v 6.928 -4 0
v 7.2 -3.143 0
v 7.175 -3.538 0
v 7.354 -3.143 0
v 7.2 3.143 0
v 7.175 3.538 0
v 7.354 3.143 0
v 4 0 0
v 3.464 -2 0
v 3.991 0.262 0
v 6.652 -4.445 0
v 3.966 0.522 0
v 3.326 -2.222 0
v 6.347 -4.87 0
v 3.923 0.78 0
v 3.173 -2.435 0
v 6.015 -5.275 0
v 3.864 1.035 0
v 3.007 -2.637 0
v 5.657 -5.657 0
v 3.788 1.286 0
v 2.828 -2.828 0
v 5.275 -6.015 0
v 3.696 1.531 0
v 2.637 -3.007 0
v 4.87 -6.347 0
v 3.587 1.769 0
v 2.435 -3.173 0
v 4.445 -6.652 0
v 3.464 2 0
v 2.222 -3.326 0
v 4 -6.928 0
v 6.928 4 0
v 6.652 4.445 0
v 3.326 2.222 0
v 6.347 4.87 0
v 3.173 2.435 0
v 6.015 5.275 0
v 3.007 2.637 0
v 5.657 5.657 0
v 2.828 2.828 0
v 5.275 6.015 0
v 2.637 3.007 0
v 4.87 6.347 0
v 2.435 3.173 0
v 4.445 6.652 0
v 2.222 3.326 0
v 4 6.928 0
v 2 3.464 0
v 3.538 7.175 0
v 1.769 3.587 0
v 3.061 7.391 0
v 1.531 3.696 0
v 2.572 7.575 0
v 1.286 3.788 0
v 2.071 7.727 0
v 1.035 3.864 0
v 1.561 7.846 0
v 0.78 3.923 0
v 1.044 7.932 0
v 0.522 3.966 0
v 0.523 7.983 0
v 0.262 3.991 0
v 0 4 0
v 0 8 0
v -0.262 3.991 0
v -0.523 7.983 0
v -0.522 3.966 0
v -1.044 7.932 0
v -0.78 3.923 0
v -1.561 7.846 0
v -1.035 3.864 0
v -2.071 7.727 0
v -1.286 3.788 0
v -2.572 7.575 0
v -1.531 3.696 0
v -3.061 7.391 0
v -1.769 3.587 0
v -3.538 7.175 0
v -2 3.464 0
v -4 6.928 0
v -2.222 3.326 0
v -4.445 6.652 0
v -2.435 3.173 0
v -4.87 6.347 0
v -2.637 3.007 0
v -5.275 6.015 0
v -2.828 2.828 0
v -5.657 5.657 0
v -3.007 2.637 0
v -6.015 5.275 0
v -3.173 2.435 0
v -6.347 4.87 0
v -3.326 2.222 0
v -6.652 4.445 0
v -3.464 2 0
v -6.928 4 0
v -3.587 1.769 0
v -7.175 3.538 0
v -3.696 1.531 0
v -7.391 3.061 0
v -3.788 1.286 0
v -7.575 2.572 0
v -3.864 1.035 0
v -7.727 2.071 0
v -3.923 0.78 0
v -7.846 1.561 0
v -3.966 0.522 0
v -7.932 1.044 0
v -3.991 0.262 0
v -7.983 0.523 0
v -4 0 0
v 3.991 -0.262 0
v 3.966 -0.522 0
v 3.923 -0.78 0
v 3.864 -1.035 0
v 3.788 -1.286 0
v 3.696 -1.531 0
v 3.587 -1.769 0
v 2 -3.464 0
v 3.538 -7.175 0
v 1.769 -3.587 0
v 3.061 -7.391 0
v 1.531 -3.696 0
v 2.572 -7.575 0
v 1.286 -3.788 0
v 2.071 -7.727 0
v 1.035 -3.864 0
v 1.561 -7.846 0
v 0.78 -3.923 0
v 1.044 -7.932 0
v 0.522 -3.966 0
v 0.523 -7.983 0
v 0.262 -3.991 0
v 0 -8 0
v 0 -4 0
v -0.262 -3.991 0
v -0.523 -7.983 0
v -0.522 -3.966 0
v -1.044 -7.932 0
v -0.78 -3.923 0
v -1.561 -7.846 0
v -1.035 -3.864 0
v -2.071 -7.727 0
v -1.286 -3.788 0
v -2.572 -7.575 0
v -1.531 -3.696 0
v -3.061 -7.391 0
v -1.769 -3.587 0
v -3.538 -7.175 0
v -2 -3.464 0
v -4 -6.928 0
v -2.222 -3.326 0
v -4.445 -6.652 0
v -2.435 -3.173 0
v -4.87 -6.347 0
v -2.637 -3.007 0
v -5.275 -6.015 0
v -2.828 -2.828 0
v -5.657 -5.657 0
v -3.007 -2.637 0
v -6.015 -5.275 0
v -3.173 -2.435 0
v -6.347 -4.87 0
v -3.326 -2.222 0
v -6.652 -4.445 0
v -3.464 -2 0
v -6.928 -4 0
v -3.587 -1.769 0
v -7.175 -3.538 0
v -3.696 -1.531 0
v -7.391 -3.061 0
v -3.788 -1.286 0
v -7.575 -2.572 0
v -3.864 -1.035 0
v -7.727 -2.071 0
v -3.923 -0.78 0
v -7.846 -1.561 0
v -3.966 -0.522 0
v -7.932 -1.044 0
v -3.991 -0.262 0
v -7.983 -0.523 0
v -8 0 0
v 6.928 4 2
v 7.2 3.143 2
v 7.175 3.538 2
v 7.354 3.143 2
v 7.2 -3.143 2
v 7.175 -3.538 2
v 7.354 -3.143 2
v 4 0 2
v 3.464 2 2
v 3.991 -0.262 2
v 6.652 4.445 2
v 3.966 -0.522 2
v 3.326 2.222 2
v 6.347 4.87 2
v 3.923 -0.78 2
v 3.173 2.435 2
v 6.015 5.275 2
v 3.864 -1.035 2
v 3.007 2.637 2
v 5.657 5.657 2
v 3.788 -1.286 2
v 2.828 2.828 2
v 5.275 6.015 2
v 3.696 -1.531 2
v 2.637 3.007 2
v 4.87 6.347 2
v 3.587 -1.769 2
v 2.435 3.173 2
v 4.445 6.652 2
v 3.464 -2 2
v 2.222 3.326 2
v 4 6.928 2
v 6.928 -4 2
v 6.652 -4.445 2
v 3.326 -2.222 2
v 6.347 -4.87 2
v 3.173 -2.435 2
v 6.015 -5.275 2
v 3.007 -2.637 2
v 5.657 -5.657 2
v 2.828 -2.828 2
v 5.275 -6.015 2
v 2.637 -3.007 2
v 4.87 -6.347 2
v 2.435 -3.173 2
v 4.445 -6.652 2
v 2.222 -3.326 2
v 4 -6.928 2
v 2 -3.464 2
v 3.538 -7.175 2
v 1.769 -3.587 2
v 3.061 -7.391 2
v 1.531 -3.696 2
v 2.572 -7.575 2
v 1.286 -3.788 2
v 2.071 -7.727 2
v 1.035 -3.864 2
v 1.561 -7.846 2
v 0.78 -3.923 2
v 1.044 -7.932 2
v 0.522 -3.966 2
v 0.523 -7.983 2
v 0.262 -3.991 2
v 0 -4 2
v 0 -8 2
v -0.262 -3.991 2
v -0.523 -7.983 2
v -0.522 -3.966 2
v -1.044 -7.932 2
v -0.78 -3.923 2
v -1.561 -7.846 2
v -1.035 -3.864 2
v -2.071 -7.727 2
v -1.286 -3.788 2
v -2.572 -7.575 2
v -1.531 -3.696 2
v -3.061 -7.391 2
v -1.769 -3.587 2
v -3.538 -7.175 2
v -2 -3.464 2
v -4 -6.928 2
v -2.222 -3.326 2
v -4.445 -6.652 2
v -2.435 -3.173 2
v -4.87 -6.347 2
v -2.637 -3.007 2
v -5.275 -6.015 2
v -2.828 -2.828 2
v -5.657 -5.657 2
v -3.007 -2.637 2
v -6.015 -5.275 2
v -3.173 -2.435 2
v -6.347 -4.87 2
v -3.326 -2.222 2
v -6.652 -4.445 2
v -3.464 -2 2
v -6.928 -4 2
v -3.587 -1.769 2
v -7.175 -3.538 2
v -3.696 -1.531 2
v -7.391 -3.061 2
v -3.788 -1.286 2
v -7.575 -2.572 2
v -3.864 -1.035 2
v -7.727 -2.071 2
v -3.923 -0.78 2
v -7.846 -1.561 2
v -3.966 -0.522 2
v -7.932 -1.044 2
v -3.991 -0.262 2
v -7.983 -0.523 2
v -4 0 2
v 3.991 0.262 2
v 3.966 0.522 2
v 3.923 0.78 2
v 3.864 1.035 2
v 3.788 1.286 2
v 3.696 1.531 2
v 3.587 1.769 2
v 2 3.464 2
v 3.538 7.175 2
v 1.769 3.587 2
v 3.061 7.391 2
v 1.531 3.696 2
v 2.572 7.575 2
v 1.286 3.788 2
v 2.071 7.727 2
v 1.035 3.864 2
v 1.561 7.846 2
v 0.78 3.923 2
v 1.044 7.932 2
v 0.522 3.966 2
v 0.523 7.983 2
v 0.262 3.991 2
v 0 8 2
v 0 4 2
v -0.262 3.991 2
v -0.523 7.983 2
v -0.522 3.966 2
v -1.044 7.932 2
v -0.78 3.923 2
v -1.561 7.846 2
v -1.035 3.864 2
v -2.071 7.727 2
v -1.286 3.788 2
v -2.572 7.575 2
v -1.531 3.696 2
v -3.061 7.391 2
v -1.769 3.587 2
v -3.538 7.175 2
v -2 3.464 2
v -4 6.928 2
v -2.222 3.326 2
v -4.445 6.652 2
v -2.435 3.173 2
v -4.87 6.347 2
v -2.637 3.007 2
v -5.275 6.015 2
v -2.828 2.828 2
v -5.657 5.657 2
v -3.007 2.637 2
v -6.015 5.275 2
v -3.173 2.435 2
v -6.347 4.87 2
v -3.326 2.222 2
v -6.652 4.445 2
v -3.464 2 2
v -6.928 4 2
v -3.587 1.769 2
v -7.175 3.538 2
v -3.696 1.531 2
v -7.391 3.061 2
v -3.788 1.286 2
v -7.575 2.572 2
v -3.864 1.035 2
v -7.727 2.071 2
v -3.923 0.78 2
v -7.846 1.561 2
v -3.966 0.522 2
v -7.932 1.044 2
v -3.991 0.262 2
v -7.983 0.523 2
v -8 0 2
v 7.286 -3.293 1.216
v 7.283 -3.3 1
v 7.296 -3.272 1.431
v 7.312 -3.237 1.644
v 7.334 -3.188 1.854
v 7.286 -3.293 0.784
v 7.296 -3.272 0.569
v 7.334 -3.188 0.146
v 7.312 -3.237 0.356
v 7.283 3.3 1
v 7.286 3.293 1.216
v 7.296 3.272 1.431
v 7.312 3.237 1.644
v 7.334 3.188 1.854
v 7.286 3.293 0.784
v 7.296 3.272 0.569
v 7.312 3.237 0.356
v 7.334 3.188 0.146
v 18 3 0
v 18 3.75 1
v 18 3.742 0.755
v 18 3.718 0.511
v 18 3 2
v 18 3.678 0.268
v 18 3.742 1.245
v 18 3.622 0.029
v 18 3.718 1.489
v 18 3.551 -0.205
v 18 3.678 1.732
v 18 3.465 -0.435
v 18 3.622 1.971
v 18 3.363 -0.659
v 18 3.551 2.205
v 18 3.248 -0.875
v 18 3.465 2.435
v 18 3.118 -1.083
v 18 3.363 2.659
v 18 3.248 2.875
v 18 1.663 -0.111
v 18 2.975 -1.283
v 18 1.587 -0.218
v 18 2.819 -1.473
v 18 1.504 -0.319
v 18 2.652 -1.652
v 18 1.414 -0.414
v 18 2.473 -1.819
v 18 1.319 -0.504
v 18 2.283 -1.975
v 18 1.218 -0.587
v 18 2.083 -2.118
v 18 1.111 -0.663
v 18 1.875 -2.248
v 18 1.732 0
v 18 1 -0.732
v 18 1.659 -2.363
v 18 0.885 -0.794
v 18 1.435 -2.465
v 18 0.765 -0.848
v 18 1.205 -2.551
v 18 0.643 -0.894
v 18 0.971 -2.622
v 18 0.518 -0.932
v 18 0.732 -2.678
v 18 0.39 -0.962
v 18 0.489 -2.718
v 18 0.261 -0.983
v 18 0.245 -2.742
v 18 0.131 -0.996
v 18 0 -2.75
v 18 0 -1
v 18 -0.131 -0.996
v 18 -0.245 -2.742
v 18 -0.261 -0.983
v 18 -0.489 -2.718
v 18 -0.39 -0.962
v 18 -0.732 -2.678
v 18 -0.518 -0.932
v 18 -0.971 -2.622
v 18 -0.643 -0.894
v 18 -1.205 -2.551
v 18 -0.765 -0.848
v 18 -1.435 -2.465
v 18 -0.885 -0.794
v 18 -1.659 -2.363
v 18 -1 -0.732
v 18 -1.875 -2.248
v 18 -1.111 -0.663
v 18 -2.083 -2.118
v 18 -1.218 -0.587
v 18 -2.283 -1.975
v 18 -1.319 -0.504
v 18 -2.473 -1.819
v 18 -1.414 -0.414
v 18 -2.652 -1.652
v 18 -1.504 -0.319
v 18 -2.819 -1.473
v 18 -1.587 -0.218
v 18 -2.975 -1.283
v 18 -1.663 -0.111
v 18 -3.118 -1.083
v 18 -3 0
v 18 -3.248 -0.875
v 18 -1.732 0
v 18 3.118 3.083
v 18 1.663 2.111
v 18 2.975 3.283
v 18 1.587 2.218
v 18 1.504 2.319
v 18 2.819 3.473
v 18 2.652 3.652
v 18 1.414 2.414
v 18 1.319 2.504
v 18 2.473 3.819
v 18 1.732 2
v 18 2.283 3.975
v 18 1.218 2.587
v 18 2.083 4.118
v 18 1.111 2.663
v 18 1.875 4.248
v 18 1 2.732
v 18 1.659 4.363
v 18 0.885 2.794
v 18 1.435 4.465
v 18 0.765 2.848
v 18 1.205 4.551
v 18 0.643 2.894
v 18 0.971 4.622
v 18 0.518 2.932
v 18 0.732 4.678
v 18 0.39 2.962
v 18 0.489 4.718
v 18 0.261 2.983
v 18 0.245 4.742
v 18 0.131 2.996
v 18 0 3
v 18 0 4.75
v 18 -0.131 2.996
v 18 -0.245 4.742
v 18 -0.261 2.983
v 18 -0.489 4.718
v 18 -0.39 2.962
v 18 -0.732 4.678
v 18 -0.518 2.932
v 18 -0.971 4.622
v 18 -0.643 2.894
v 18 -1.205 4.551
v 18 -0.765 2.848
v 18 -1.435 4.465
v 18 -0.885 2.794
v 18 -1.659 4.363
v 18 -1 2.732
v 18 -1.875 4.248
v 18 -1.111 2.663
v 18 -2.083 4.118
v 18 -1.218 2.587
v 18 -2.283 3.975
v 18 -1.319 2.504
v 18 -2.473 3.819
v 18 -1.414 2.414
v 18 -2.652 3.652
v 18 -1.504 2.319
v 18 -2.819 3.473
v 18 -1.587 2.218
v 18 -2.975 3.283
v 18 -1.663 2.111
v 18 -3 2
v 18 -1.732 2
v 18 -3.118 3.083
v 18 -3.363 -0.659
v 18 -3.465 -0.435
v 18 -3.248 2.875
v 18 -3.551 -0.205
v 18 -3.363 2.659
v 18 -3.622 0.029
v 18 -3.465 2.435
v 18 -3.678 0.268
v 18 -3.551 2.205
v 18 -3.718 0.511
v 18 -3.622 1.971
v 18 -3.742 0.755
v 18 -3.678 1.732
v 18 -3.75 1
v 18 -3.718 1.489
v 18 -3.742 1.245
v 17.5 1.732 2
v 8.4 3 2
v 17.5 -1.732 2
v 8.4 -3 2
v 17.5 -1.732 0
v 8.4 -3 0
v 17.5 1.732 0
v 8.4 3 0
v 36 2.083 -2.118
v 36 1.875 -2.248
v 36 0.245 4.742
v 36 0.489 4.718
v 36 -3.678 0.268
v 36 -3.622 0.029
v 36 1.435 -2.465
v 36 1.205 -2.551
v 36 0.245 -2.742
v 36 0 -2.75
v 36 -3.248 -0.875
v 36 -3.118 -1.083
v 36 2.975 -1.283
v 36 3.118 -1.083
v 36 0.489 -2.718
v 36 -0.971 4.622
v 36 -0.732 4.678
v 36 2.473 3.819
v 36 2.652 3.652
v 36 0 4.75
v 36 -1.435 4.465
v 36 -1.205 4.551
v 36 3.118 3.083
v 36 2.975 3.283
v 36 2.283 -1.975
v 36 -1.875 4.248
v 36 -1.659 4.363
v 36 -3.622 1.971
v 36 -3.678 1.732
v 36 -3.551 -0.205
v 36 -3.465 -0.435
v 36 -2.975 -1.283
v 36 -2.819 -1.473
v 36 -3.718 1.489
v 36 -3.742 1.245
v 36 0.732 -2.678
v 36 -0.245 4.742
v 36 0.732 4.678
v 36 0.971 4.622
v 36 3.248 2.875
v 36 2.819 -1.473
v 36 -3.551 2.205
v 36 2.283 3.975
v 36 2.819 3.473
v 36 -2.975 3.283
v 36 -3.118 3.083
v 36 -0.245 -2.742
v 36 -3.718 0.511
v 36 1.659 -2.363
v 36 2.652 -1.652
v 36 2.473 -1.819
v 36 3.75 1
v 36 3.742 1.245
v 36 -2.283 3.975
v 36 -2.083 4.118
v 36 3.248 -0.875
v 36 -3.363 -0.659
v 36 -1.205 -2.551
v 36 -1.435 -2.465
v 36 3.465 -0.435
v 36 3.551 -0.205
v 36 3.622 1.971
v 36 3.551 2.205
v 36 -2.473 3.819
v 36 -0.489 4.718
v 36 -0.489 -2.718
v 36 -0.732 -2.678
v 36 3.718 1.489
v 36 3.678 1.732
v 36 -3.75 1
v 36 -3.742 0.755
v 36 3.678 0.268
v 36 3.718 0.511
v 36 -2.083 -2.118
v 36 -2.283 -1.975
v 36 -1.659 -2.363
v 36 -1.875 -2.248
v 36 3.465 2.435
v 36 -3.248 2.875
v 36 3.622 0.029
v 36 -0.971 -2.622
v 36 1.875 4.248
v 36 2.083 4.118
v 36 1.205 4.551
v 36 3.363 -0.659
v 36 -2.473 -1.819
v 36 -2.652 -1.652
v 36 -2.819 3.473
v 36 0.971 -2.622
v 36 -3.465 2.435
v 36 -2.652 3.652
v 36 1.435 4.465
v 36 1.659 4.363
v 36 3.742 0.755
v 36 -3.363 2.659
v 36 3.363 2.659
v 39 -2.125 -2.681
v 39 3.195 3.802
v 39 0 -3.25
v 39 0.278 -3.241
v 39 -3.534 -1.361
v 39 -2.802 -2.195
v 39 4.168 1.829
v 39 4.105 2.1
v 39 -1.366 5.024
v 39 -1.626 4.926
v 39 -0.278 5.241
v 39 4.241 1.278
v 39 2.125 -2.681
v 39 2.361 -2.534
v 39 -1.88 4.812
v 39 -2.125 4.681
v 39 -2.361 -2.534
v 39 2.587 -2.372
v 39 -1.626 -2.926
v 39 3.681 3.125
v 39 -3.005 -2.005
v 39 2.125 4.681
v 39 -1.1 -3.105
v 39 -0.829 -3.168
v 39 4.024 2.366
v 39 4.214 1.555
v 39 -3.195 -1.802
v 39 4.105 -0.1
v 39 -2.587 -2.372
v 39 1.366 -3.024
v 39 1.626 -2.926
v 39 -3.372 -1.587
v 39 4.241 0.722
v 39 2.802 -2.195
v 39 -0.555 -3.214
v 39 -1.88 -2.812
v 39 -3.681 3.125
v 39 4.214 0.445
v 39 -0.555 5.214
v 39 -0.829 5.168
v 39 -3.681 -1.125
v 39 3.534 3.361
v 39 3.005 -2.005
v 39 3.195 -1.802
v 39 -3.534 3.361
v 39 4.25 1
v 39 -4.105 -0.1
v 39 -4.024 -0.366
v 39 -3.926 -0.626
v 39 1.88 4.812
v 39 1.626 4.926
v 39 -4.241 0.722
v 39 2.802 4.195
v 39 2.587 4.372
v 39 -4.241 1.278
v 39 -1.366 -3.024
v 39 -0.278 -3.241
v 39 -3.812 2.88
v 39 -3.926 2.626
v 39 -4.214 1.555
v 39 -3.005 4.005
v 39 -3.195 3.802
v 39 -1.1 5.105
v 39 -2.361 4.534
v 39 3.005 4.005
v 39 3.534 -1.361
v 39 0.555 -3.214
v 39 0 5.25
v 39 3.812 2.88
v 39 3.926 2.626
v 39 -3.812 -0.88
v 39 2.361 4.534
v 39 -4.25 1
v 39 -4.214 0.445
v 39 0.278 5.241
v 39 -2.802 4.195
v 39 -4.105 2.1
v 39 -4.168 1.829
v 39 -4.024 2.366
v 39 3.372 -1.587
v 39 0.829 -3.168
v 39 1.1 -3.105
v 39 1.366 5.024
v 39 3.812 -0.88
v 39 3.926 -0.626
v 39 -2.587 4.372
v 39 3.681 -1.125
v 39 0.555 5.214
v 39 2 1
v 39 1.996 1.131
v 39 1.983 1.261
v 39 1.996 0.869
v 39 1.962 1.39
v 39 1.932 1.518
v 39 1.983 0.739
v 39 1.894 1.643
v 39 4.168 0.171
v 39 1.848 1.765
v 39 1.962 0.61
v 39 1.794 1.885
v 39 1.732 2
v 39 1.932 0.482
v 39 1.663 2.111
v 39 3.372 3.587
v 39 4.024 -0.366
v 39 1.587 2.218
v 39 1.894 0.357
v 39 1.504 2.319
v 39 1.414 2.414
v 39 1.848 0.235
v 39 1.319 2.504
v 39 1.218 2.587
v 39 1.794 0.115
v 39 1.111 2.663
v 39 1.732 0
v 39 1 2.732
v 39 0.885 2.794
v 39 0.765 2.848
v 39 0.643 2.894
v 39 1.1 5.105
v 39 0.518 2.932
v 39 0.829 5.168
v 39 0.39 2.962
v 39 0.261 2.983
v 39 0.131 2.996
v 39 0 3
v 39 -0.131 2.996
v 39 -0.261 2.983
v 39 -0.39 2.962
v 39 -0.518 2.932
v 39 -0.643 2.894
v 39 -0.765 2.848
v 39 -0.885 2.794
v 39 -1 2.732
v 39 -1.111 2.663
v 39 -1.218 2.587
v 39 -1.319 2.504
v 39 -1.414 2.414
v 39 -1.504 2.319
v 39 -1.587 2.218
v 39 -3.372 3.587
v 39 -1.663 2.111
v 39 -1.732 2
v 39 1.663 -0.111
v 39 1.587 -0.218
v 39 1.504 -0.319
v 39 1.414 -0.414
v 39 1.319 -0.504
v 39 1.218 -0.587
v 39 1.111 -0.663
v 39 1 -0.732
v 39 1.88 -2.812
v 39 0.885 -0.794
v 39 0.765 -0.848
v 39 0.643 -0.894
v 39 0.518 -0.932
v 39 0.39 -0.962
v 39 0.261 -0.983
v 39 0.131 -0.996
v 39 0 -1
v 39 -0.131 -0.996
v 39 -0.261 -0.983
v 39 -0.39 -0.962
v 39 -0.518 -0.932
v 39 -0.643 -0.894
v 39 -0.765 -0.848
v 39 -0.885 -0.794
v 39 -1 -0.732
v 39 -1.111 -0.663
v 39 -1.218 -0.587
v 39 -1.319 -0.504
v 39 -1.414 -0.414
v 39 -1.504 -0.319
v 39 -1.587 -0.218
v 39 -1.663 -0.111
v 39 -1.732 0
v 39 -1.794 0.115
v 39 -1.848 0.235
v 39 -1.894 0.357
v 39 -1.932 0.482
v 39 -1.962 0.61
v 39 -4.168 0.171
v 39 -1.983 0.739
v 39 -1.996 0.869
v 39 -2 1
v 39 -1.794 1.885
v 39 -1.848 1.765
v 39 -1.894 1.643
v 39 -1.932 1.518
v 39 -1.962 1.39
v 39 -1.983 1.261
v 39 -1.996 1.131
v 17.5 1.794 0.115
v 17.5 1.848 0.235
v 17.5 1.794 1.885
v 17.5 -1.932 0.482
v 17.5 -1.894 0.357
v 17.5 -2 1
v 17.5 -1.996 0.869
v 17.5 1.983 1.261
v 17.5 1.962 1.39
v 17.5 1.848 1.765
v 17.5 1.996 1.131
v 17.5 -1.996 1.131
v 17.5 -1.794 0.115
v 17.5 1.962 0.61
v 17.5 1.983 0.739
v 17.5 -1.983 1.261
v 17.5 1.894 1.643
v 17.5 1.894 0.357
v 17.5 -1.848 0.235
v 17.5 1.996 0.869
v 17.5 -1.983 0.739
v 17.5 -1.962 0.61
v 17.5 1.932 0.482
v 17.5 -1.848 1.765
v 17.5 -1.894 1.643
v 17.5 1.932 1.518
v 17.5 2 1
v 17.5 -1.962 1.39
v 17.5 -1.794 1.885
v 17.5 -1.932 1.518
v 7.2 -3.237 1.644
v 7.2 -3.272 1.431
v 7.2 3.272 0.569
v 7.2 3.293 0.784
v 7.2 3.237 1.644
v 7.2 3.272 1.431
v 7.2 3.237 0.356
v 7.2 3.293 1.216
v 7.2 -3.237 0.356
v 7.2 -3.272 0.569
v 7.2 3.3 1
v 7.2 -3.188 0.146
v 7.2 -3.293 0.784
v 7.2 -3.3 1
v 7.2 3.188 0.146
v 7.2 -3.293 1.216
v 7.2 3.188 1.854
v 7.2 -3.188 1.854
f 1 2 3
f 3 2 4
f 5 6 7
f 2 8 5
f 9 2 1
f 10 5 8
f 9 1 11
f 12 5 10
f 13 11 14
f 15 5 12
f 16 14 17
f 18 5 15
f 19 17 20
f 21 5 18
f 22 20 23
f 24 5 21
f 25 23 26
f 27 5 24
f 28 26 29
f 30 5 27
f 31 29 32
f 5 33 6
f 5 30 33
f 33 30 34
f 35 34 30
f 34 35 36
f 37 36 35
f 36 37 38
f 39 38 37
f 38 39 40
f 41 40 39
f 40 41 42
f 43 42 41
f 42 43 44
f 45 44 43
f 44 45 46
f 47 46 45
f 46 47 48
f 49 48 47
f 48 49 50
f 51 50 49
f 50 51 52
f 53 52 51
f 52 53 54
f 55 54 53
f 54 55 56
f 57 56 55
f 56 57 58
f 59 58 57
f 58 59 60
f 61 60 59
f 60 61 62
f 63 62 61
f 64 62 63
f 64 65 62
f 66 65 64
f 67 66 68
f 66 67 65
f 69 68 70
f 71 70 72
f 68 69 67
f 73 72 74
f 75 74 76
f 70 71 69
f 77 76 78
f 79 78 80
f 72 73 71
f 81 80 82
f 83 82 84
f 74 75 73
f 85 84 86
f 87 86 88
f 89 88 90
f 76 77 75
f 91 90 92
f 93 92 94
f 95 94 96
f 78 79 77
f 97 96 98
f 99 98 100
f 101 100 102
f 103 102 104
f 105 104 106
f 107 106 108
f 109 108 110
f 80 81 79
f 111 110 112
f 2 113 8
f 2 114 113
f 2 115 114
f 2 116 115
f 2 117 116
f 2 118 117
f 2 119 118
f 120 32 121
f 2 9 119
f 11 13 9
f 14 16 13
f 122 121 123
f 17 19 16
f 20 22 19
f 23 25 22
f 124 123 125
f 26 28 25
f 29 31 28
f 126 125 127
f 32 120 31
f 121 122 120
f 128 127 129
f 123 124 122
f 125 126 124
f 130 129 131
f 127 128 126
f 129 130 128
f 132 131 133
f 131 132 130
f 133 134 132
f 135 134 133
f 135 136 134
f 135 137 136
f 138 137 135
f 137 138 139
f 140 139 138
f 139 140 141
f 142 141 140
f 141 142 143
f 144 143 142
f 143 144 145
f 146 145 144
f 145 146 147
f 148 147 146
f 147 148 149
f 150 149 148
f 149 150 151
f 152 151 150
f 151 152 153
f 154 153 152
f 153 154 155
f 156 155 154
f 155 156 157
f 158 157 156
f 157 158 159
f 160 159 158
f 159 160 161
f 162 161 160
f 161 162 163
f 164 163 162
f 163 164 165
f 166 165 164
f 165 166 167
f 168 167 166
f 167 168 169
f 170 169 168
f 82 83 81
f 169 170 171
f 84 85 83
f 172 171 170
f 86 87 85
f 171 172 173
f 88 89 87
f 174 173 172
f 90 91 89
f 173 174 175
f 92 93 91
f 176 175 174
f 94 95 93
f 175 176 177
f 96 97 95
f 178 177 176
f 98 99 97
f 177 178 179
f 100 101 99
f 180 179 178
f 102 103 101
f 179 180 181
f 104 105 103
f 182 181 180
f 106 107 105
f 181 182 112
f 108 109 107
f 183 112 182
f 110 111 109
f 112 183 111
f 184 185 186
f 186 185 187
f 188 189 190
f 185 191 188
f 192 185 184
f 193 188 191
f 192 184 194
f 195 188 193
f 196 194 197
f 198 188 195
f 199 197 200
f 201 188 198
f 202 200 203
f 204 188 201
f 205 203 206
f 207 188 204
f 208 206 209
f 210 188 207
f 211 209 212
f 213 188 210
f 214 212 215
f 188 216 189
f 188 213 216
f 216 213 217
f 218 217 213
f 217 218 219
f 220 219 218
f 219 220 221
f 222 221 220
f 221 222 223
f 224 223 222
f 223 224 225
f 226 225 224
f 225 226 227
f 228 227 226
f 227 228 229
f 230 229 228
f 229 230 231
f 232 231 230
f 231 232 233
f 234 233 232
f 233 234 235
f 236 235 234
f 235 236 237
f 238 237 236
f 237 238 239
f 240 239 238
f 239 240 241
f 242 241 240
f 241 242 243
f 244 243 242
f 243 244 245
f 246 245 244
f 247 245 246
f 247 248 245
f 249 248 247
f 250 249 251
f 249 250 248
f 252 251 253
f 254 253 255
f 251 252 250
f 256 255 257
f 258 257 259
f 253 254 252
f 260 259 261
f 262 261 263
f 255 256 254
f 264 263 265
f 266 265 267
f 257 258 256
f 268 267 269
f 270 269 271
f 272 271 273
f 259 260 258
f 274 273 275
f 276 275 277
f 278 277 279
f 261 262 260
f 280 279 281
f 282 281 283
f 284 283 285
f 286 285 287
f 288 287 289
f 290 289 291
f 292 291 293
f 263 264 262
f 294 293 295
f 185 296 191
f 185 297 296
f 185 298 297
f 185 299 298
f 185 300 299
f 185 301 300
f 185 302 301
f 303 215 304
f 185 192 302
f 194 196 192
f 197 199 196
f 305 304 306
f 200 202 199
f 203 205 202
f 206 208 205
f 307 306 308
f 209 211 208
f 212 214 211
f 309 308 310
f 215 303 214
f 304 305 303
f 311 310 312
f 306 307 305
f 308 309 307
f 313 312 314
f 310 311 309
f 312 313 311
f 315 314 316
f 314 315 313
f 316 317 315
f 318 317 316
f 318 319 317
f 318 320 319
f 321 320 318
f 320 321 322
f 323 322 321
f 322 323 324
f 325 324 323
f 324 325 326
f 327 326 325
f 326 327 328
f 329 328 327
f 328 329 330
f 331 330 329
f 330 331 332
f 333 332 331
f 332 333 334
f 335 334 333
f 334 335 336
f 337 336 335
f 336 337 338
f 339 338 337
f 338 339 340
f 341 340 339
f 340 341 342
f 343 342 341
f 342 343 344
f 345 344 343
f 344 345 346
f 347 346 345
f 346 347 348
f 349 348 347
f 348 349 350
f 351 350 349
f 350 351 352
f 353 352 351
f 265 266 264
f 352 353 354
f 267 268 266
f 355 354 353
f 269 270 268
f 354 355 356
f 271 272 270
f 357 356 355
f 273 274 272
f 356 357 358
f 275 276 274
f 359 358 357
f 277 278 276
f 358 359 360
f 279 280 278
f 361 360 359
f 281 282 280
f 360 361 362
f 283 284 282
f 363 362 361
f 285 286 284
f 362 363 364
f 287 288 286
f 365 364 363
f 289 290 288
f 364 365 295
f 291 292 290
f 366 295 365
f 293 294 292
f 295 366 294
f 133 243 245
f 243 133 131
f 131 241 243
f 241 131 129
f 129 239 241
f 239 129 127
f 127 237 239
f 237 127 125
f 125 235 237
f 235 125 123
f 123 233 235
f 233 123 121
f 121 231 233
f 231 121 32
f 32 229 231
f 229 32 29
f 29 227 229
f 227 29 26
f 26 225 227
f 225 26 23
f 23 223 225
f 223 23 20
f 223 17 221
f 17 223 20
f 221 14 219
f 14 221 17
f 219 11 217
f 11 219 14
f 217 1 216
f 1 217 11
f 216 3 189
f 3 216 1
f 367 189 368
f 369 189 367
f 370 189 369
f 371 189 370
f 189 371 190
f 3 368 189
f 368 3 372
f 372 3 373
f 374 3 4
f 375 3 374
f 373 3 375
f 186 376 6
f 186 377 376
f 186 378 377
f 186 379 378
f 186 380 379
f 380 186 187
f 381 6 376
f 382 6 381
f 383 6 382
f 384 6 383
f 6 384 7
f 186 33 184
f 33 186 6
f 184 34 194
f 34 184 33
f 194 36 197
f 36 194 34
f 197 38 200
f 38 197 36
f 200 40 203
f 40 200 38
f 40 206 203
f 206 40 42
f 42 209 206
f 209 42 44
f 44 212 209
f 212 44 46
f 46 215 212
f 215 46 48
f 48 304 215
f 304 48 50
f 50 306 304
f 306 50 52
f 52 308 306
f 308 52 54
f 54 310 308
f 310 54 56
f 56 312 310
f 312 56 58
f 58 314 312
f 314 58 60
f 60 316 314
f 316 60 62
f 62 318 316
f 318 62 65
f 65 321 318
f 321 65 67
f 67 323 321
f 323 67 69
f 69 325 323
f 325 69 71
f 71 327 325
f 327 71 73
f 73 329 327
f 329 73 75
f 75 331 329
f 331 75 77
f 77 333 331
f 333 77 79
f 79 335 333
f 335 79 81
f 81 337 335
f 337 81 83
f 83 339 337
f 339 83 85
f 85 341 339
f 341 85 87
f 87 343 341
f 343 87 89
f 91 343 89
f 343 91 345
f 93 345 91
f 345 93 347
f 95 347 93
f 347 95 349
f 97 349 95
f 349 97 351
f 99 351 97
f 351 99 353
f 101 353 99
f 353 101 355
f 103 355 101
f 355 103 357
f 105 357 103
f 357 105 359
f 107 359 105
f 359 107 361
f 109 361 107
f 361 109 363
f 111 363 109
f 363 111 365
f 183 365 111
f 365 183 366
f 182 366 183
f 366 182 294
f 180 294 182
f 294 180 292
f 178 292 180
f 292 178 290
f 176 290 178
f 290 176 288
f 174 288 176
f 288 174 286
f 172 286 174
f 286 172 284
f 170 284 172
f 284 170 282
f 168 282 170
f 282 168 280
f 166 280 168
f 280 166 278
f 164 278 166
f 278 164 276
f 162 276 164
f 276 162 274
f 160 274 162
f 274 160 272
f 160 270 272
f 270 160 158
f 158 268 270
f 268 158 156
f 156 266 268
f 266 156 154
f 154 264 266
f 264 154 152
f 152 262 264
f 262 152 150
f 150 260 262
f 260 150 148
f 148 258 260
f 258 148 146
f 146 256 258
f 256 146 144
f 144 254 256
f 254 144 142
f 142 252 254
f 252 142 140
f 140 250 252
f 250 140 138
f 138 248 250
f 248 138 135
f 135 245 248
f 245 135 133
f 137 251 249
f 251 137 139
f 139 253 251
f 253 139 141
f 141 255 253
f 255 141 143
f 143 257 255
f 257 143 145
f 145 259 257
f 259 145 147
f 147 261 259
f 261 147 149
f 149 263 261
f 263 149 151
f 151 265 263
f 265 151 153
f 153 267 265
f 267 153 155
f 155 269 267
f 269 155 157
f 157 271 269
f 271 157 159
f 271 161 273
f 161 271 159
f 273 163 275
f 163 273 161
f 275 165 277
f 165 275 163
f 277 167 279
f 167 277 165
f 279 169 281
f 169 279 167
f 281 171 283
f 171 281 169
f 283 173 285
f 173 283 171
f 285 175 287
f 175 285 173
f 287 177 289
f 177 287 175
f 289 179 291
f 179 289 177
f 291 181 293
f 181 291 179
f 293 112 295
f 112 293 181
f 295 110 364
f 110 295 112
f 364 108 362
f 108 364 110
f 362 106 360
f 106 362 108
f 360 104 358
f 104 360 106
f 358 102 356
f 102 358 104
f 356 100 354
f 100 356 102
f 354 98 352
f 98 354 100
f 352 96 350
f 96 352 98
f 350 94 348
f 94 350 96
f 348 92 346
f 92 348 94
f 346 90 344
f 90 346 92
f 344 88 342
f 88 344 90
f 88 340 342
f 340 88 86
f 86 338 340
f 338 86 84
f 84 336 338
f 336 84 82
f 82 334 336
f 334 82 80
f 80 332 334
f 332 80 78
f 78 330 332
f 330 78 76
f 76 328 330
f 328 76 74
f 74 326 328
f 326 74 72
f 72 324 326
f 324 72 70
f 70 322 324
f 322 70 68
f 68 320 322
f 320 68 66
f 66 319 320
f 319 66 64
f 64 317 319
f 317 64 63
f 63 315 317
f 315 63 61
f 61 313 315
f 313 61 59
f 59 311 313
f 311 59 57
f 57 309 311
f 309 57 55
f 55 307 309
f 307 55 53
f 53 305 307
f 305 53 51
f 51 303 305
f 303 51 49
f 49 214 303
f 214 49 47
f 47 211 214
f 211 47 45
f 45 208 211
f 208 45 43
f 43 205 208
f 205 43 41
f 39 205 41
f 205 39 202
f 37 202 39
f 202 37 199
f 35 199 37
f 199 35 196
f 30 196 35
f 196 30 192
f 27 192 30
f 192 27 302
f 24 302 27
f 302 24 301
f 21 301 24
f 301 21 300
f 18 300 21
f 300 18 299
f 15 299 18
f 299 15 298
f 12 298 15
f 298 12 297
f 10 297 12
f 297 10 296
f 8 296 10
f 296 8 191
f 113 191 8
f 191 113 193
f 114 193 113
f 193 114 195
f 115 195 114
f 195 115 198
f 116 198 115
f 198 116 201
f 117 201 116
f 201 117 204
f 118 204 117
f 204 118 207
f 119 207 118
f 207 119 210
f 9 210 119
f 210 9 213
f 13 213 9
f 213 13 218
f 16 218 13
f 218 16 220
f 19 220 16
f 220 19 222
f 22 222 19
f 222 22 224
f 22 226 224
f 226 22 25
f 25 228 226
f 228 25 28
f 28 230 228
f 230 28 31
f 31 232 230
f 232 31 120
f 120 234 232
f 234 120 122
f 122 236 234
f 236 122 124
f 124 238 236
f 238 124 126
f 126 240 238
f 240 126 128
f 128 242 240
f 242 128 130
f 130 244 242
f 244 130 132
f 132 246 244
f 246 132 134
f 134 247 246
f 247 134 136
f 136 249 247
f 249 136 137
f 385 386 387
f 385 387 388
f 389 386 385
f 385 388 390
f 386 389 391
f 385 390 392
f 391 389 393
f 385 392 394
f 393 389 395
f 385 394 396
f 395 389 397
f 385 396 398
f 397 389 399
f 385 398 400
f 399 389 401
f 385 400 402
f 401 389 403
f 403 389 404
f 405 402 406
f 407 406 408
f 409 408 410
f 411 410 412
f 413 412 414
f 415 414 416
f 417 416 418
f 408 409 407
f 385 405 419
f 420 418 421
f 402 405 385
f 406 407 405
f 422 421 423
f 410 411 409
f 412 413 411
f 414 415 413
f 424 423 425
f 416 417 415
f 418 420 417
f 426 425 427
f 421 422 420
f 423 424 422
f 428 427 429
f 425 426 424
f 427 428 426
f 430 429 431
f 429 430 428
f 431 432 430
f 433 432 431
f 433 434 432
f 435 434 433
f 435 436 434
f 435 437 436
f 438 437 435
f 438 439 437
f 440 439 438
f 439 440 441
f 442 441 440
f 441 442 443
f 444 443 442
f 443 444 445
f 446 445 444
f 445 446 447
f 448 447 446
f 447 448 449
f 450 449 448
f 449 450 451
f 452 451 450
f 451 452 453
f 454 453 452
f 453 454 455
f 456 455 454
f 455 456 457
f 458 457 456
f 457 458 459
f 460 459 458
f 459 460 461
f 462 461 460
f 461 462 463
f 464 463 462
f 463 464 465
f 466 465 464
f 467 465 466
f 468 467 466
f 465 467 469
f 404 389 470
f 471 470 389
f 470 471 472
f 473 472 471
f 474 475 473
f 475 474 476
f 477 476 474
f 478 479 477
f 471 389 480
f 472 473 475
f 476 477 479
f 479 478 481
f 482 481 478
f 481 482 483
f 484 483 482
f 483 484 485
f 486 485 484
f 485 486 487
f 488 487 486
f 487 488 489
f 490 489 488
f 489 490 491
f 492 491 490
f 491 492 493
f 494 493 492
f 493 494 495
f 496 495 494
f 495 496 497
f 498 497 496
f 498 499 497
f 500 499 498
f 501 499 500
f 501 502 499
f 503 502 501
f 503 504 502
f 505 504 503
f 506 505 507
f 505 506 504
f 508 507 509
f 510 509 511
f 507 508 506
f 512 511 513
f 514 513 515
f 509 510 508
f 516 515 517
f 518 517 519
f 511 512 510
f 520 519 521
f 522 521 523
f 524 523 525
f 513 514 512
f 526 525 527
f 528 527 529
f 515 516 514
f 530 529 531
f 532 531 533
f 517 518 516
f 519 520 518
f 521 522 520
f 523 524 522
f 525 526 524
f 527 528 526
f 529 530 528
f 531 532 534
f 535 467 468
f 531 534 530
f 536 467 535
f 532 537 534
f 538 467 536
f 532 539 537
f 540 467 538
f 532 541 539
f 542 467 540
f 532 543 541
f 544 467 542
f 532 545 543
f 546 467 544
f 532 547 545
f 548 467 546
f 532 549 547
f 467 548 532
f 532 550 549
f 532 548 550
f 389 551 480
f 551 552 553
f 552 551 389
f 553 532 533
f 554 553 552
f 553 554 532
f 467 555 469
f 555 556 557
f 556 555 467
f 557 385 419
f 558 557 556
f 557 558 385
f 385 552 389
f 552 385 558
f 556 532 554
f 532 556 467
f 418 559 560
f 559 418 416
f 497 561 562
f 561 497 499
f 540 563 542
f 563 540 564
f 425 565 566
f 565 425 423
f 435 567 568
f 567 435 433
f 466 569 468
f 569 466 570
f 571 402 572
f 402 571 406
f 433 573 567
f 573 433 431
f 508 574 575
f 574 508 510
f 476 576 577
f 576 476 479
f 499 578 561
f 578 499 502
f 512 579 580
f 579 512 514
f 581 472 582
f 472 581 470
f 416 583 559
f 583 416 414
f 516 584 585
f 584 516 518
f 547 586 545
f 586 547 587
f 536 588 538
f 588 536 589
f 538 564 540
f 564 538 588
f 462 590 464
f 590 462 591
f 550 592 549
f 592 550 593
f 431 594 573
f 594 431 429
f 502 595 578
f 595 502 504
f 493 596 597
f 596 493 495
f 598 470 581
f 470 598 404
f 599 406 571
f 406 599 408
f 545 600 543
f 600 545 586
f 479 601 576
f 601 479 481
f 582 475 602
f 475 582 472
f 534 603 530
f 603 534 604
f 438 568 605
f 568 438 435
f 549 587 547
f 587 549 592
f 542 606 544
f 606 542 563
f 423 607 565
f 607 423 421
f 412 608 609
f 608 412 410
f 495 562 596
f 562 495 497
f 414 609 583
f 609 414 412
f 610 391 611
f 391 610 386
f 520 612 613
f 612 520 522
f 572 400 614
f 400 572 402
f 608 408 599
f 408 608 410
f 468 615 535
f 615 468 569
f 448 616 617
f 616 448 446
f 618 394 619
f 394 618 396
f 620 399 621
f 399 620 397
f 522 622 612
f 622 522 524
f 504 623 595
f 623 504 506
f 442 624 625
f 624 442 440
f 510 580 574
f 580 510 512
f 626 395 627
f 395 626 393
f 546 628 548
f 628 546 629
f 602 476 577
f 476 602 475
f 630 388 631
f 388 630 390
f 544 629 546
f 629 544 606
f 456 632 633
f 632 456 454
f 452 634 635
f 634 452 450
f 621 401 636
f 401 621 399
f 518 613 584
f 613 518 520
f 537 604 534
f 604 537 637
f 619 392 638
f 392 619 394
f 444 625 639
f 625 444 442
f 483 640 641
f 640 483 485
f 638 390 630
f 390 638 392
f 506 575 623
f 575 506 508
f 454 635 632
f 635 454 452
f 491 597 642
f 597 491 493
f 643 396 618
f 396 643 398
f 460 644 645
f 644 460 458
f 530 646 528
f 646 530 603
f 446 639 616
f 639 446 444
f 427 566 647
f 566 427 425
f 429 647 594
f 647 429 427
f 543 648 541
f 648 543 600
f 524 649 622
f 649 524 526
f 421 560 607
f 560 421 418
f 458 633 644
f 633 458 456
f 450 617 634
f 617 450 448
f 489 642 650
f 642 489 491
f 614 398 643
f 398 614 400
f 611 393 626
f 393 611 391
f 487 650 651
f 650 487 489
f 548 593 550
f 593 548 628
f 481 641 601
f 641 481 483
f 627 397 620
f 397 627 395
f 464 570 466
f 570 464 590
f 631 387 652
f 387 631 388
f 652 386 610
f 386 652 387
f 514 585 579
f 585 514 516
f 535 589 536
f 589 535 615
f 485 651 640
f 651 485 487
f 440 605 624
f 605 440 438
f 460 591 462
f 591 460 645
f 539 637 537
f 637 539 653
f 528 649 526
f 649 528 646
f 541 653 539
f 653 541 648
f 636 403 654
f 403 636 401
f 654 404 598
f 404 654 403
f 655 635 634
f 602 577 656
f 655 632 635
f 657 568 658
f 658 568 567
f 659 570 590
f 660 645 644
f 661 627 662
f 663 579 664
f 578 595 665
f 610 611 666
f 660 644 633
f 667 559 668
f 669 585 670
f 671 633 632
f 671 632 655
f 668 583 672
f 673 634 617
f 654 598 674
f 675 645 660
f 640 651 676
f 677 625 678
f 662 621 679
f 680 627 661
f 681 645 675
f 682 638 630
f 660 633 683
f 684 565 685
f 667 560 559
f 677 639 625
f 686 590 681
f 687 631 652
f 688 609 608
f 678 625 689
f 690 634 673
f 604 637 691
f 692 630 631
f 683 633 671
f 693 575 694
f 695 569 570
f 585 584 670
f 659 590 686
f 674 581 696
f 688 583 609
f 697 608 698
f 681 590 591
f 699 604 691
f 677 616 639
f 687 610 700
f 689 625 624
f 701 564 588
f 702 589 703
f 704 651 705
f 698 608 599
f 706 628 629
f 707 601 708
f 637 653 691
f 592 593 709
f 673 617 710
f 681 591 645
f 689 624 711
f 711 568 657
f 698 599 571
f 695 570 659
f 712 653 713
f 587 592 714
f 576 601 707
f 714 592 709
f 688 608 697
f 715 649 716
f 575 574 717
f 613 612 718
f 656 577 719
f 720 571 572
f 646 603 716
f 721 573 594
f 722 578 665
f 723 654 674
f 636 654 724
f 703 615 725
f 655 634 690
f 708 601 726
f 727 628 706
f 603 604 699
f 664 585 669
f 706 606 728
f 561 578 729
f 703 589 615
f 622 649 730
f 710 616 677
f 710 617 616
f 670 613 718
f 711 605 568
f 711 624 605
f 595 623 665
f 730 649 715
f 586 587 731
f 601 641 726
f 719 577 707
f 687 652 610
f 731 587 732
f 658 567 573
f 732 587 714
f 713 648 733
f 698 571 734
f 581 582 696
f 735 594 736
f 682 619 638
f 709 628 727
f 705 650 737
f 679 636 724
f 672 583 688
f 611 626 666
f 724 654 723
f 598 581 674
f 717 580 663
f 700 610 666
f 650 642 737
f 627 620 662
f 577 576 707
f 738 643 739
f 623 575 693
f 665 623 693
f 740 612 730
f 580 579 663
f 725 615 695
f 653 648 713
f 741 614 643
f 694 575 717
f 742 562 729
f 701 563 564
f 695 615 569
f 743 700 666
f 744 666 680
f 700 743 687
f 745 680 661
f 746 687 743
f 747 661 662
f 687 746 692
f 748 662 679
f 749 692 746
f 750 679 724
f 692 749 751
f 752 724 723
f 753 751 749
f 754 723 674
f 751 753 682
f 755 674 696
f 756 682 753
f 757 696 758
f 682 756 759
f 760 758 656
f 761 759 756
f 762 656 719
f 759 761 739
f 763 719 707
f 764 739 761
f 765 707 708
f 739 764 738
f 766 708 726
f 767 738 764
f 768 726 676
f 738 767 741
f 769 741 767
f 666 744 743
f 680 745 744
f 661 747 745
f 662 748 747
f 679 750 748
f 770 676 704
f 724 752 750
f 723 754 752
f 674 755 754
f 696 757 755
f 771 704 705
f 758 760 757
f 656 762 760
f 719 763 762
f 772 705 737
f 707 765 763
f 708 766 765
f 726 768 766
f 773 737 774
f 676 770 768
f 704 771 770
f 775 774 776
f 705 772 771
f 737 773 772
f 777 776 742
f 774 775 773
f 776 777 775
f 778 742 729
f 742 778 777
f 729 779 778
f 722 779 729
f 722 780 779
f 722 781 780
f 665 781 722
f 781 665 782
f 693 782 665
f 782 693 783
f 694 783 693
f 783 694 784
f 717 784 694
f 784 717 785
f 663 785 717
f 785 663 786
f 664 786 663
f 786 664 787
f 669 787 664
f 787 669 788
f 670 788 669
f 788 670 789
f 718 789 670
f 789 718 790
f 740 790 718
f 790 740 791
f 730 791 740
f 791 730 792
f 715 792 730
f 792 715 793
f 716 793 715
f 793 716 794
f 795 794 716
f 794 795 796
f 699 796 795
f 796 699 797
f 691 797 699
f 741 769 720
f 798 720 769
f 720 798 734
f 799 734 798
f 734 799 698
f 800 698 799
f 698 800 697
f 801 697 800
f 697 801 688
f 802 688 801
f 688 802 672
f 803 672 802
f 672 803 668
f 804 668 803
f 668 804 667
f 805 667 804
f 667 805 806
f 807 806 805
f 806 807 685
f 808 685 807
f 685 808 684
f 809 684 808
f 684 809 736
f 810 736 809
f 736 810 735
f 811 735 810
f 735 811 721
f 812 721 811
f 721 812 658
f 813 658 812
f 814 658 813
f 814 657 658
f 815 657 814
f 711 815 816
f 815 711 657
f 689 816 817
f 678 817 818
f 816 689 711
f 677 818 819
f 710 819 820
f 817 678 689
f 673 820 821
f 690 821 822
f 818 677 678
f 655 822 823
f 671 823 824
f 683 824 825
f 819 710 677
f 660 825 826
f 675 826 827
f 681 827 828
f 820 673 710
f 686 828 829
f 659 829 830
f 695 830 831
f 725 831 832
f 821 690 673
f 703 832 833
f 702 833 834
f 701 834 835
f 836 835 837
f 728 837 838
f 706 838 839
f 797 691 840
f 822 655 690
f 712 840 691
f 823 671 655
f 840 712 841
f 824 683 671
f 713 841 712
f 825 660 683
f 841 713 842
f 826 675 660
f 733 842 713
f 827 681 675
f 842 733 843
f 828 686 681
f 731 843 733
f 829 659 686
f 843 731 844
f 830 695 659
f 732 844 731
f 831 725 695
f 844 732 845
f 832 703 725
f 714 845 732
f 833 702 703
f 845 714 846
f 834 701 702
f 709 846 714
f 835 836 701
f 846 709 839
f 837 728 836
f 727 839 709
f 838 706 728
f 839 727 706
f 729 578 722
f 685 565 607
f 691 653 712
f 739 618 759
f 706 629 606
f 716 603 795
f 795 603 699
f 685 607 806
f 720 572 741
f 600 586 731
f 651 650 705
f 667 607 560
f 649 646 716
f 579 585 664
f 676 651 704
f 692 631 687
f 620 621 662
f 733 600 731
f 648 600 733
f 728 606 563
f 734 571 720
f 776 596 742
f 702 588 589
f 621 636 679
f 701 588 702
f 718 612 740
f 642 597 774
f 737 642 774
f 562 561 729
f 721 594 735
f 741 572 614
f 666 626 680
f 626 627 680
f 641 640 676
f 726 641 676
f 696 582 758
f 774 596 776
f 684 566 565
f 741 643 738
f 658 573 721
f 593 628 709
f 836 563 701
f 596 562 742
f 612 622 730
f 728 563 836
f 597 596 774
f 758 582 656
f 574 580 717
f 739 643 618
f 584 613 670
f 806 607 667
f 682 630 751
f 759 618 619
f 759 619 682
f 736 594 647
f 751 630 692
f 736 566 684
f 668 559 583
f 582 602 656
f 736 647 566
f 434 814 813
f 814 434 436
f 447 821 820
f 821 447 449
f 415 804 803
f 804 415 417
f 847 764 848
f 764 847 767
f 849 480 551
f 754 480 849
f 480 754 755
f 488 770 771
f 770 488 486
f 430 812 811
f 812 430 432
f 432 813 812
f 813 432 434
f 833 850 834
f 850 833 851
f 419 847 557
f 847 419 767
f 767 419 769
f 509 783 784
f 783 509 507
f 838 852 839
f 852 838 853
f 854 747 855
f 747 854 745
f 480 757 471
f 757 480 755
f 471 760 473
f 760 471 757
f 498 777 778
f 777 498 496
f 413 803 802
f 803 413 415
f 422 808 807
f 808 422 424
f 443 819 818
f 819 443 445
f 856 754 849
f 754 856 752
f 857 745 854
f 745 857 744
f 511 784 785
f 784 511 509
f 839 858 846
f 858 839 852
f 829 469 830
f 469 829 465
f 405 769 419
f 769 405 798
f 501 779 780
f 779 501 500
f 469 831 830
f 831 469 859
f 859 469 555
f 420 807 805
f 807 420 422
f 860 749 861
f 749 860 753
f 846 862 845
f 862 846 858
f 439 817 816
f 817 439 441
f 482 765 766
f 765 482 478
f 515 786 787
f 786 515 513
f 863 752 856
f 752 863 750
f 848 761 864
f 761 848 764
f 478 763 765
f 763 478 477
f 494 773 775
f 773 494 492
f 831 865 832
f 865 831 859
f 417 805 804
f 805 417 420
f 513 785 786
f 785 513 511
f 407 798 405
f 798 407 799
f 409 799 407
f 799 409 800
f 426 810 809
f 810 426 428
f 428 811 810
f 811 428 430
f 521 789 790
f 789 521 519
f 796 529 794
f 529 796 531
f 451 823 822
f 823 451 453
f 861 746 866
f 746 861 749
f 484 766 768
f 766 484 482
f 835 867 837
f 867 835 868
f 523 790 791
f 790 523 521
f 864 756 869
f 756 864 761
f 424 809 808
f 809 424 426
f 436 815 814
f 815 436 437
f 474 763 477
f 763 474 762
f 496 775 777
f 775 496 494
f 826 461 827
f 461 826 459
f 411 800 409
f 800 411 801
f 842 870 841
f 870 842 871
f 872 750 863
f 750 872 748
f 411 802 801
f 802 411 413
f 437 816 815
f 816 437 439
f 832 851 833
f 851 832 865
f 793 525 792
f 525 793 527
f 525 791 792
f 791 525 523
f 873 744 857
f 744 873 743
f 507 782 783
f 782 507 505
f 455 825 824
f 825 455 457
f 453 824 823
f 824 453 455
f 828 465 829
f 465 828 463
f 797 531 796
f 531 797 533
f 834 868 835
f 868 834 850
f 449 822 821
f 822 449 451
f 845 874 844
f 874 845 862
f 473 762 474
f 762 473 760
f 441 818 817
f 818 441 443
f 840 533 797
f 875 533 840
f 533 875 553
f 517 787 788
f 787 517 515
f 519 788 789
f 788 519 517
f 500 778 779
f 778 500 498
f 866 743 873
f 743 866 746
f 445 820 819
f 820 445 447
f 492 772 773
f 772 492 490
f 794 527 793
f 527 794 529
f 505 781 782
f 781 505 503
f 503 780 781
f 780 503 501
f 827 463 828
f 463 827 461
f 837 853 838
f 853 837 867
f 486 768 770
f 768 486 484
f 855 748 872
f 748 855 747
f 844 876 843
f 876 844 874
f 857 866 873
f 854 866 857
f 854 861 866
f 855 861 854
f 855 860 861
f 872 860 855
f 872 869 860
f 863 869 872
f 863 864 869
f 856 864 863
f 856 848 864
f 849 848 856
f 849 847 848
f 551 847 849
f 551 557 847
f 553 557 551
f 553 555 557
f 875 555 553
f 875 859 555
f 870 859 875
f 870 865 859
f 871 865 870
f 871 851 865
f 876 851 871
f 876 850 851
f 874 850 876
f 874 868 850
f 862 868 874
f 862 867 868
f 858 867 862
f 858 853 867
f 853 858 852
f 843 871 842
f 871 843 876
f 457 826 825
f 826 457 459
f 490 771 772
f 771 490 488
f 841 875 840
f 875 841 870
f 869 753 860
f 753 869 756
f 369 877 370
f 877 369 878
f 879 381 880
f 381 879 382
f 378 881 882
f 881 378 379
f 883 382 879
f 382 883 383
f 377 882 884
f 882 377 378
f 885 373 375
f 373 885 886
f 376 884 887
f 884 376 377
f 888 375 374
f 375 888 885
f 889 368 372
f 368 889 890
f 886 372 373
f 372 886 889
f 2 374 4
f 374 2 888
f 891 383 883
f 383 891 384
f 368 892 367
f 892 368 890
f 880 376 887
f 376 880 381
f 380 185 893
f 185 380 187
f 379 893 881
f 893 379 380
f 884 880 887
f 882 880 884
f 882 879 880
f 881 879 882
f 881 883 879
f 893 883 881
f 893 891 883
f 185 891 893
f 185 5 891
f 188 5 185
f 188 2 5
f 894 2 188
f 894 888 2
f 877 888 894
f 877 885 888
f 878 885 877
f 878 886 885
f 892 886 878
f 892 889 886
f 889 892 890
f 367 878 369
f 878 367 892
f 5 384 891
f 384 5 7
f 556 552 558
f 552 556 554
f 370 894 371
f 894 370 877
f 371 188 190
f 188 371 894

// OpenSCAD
$fn = 96;

// Ring terminal parameters (mm)
ring_od = 16;          // outer diameter of ring
ring_id = 8;           // inner hole diameter
ring_th = 2.0;         // thickness (Z)

neck_len = 10;         // length from ring tangent to barrel start
neck_w   = 6.0;        // neck width
neck_th  = ring_th;    // neck thickness

barrel_len = 18;       // barrel length
barrel_od  = 7.5;      // barrel outer diameter
wire_id    = 4.0;      // wire hole diameter

flare_len  = 3.0;      // small flare at barrel end
flare_od   = 8.5;      // flare outer diameter

// Derived
ring_r_out = ring_od/2;
ring_r_in  = ring_id/2;

module ring_terminal() {
  difference() {
    union() {
      // Ring
      linear_extrude(height=ring_th)
        difference() {
          circle(r=ring_r_out);
          circle(r=ring_r_in);
        }

      // Neck (rectangular strap) attached to ring at +X side
      translate([ring_r_out, -neck_w/2, 0])
        cube([neck_len, neck_w, neck_th], center=false);

      // Barrel (tube) aligned along +X, centered on neck
      translate([ring_r_out + neck_len, 0, ring_th/2])
        rotate([0,90,0])
          cylinder(h=barrel_len, r=barrel_od/2, center=false);

      // Flare at barrel end
      translate([ring_r_out + neck_len + barrel_len, 0, ring_th/2])
        rotate([0,90,0])
          cylinder(h=flare_len, r1=barrel_od/2, r2=flare_od/2, center=false);
    }

    // Wire hole through barrel + flare
    translate([ring_r_out + neck_len - 0.5, 0, ring_th/2])
      rotate([0,90,0])
        cylinder(h=barrel_len + flare_len + 1.0, r=wire_id/2, center=false);

    // Slight relief where neck meets ring (optional smoothing cut)
    translate([ring_r_out - 0.2, 0, ring_th/2])
      rotate([0,90,0])
        cylinder(h=1.2, r=neck_w*0.55, center=true);
  }
}

ring_terminal();
